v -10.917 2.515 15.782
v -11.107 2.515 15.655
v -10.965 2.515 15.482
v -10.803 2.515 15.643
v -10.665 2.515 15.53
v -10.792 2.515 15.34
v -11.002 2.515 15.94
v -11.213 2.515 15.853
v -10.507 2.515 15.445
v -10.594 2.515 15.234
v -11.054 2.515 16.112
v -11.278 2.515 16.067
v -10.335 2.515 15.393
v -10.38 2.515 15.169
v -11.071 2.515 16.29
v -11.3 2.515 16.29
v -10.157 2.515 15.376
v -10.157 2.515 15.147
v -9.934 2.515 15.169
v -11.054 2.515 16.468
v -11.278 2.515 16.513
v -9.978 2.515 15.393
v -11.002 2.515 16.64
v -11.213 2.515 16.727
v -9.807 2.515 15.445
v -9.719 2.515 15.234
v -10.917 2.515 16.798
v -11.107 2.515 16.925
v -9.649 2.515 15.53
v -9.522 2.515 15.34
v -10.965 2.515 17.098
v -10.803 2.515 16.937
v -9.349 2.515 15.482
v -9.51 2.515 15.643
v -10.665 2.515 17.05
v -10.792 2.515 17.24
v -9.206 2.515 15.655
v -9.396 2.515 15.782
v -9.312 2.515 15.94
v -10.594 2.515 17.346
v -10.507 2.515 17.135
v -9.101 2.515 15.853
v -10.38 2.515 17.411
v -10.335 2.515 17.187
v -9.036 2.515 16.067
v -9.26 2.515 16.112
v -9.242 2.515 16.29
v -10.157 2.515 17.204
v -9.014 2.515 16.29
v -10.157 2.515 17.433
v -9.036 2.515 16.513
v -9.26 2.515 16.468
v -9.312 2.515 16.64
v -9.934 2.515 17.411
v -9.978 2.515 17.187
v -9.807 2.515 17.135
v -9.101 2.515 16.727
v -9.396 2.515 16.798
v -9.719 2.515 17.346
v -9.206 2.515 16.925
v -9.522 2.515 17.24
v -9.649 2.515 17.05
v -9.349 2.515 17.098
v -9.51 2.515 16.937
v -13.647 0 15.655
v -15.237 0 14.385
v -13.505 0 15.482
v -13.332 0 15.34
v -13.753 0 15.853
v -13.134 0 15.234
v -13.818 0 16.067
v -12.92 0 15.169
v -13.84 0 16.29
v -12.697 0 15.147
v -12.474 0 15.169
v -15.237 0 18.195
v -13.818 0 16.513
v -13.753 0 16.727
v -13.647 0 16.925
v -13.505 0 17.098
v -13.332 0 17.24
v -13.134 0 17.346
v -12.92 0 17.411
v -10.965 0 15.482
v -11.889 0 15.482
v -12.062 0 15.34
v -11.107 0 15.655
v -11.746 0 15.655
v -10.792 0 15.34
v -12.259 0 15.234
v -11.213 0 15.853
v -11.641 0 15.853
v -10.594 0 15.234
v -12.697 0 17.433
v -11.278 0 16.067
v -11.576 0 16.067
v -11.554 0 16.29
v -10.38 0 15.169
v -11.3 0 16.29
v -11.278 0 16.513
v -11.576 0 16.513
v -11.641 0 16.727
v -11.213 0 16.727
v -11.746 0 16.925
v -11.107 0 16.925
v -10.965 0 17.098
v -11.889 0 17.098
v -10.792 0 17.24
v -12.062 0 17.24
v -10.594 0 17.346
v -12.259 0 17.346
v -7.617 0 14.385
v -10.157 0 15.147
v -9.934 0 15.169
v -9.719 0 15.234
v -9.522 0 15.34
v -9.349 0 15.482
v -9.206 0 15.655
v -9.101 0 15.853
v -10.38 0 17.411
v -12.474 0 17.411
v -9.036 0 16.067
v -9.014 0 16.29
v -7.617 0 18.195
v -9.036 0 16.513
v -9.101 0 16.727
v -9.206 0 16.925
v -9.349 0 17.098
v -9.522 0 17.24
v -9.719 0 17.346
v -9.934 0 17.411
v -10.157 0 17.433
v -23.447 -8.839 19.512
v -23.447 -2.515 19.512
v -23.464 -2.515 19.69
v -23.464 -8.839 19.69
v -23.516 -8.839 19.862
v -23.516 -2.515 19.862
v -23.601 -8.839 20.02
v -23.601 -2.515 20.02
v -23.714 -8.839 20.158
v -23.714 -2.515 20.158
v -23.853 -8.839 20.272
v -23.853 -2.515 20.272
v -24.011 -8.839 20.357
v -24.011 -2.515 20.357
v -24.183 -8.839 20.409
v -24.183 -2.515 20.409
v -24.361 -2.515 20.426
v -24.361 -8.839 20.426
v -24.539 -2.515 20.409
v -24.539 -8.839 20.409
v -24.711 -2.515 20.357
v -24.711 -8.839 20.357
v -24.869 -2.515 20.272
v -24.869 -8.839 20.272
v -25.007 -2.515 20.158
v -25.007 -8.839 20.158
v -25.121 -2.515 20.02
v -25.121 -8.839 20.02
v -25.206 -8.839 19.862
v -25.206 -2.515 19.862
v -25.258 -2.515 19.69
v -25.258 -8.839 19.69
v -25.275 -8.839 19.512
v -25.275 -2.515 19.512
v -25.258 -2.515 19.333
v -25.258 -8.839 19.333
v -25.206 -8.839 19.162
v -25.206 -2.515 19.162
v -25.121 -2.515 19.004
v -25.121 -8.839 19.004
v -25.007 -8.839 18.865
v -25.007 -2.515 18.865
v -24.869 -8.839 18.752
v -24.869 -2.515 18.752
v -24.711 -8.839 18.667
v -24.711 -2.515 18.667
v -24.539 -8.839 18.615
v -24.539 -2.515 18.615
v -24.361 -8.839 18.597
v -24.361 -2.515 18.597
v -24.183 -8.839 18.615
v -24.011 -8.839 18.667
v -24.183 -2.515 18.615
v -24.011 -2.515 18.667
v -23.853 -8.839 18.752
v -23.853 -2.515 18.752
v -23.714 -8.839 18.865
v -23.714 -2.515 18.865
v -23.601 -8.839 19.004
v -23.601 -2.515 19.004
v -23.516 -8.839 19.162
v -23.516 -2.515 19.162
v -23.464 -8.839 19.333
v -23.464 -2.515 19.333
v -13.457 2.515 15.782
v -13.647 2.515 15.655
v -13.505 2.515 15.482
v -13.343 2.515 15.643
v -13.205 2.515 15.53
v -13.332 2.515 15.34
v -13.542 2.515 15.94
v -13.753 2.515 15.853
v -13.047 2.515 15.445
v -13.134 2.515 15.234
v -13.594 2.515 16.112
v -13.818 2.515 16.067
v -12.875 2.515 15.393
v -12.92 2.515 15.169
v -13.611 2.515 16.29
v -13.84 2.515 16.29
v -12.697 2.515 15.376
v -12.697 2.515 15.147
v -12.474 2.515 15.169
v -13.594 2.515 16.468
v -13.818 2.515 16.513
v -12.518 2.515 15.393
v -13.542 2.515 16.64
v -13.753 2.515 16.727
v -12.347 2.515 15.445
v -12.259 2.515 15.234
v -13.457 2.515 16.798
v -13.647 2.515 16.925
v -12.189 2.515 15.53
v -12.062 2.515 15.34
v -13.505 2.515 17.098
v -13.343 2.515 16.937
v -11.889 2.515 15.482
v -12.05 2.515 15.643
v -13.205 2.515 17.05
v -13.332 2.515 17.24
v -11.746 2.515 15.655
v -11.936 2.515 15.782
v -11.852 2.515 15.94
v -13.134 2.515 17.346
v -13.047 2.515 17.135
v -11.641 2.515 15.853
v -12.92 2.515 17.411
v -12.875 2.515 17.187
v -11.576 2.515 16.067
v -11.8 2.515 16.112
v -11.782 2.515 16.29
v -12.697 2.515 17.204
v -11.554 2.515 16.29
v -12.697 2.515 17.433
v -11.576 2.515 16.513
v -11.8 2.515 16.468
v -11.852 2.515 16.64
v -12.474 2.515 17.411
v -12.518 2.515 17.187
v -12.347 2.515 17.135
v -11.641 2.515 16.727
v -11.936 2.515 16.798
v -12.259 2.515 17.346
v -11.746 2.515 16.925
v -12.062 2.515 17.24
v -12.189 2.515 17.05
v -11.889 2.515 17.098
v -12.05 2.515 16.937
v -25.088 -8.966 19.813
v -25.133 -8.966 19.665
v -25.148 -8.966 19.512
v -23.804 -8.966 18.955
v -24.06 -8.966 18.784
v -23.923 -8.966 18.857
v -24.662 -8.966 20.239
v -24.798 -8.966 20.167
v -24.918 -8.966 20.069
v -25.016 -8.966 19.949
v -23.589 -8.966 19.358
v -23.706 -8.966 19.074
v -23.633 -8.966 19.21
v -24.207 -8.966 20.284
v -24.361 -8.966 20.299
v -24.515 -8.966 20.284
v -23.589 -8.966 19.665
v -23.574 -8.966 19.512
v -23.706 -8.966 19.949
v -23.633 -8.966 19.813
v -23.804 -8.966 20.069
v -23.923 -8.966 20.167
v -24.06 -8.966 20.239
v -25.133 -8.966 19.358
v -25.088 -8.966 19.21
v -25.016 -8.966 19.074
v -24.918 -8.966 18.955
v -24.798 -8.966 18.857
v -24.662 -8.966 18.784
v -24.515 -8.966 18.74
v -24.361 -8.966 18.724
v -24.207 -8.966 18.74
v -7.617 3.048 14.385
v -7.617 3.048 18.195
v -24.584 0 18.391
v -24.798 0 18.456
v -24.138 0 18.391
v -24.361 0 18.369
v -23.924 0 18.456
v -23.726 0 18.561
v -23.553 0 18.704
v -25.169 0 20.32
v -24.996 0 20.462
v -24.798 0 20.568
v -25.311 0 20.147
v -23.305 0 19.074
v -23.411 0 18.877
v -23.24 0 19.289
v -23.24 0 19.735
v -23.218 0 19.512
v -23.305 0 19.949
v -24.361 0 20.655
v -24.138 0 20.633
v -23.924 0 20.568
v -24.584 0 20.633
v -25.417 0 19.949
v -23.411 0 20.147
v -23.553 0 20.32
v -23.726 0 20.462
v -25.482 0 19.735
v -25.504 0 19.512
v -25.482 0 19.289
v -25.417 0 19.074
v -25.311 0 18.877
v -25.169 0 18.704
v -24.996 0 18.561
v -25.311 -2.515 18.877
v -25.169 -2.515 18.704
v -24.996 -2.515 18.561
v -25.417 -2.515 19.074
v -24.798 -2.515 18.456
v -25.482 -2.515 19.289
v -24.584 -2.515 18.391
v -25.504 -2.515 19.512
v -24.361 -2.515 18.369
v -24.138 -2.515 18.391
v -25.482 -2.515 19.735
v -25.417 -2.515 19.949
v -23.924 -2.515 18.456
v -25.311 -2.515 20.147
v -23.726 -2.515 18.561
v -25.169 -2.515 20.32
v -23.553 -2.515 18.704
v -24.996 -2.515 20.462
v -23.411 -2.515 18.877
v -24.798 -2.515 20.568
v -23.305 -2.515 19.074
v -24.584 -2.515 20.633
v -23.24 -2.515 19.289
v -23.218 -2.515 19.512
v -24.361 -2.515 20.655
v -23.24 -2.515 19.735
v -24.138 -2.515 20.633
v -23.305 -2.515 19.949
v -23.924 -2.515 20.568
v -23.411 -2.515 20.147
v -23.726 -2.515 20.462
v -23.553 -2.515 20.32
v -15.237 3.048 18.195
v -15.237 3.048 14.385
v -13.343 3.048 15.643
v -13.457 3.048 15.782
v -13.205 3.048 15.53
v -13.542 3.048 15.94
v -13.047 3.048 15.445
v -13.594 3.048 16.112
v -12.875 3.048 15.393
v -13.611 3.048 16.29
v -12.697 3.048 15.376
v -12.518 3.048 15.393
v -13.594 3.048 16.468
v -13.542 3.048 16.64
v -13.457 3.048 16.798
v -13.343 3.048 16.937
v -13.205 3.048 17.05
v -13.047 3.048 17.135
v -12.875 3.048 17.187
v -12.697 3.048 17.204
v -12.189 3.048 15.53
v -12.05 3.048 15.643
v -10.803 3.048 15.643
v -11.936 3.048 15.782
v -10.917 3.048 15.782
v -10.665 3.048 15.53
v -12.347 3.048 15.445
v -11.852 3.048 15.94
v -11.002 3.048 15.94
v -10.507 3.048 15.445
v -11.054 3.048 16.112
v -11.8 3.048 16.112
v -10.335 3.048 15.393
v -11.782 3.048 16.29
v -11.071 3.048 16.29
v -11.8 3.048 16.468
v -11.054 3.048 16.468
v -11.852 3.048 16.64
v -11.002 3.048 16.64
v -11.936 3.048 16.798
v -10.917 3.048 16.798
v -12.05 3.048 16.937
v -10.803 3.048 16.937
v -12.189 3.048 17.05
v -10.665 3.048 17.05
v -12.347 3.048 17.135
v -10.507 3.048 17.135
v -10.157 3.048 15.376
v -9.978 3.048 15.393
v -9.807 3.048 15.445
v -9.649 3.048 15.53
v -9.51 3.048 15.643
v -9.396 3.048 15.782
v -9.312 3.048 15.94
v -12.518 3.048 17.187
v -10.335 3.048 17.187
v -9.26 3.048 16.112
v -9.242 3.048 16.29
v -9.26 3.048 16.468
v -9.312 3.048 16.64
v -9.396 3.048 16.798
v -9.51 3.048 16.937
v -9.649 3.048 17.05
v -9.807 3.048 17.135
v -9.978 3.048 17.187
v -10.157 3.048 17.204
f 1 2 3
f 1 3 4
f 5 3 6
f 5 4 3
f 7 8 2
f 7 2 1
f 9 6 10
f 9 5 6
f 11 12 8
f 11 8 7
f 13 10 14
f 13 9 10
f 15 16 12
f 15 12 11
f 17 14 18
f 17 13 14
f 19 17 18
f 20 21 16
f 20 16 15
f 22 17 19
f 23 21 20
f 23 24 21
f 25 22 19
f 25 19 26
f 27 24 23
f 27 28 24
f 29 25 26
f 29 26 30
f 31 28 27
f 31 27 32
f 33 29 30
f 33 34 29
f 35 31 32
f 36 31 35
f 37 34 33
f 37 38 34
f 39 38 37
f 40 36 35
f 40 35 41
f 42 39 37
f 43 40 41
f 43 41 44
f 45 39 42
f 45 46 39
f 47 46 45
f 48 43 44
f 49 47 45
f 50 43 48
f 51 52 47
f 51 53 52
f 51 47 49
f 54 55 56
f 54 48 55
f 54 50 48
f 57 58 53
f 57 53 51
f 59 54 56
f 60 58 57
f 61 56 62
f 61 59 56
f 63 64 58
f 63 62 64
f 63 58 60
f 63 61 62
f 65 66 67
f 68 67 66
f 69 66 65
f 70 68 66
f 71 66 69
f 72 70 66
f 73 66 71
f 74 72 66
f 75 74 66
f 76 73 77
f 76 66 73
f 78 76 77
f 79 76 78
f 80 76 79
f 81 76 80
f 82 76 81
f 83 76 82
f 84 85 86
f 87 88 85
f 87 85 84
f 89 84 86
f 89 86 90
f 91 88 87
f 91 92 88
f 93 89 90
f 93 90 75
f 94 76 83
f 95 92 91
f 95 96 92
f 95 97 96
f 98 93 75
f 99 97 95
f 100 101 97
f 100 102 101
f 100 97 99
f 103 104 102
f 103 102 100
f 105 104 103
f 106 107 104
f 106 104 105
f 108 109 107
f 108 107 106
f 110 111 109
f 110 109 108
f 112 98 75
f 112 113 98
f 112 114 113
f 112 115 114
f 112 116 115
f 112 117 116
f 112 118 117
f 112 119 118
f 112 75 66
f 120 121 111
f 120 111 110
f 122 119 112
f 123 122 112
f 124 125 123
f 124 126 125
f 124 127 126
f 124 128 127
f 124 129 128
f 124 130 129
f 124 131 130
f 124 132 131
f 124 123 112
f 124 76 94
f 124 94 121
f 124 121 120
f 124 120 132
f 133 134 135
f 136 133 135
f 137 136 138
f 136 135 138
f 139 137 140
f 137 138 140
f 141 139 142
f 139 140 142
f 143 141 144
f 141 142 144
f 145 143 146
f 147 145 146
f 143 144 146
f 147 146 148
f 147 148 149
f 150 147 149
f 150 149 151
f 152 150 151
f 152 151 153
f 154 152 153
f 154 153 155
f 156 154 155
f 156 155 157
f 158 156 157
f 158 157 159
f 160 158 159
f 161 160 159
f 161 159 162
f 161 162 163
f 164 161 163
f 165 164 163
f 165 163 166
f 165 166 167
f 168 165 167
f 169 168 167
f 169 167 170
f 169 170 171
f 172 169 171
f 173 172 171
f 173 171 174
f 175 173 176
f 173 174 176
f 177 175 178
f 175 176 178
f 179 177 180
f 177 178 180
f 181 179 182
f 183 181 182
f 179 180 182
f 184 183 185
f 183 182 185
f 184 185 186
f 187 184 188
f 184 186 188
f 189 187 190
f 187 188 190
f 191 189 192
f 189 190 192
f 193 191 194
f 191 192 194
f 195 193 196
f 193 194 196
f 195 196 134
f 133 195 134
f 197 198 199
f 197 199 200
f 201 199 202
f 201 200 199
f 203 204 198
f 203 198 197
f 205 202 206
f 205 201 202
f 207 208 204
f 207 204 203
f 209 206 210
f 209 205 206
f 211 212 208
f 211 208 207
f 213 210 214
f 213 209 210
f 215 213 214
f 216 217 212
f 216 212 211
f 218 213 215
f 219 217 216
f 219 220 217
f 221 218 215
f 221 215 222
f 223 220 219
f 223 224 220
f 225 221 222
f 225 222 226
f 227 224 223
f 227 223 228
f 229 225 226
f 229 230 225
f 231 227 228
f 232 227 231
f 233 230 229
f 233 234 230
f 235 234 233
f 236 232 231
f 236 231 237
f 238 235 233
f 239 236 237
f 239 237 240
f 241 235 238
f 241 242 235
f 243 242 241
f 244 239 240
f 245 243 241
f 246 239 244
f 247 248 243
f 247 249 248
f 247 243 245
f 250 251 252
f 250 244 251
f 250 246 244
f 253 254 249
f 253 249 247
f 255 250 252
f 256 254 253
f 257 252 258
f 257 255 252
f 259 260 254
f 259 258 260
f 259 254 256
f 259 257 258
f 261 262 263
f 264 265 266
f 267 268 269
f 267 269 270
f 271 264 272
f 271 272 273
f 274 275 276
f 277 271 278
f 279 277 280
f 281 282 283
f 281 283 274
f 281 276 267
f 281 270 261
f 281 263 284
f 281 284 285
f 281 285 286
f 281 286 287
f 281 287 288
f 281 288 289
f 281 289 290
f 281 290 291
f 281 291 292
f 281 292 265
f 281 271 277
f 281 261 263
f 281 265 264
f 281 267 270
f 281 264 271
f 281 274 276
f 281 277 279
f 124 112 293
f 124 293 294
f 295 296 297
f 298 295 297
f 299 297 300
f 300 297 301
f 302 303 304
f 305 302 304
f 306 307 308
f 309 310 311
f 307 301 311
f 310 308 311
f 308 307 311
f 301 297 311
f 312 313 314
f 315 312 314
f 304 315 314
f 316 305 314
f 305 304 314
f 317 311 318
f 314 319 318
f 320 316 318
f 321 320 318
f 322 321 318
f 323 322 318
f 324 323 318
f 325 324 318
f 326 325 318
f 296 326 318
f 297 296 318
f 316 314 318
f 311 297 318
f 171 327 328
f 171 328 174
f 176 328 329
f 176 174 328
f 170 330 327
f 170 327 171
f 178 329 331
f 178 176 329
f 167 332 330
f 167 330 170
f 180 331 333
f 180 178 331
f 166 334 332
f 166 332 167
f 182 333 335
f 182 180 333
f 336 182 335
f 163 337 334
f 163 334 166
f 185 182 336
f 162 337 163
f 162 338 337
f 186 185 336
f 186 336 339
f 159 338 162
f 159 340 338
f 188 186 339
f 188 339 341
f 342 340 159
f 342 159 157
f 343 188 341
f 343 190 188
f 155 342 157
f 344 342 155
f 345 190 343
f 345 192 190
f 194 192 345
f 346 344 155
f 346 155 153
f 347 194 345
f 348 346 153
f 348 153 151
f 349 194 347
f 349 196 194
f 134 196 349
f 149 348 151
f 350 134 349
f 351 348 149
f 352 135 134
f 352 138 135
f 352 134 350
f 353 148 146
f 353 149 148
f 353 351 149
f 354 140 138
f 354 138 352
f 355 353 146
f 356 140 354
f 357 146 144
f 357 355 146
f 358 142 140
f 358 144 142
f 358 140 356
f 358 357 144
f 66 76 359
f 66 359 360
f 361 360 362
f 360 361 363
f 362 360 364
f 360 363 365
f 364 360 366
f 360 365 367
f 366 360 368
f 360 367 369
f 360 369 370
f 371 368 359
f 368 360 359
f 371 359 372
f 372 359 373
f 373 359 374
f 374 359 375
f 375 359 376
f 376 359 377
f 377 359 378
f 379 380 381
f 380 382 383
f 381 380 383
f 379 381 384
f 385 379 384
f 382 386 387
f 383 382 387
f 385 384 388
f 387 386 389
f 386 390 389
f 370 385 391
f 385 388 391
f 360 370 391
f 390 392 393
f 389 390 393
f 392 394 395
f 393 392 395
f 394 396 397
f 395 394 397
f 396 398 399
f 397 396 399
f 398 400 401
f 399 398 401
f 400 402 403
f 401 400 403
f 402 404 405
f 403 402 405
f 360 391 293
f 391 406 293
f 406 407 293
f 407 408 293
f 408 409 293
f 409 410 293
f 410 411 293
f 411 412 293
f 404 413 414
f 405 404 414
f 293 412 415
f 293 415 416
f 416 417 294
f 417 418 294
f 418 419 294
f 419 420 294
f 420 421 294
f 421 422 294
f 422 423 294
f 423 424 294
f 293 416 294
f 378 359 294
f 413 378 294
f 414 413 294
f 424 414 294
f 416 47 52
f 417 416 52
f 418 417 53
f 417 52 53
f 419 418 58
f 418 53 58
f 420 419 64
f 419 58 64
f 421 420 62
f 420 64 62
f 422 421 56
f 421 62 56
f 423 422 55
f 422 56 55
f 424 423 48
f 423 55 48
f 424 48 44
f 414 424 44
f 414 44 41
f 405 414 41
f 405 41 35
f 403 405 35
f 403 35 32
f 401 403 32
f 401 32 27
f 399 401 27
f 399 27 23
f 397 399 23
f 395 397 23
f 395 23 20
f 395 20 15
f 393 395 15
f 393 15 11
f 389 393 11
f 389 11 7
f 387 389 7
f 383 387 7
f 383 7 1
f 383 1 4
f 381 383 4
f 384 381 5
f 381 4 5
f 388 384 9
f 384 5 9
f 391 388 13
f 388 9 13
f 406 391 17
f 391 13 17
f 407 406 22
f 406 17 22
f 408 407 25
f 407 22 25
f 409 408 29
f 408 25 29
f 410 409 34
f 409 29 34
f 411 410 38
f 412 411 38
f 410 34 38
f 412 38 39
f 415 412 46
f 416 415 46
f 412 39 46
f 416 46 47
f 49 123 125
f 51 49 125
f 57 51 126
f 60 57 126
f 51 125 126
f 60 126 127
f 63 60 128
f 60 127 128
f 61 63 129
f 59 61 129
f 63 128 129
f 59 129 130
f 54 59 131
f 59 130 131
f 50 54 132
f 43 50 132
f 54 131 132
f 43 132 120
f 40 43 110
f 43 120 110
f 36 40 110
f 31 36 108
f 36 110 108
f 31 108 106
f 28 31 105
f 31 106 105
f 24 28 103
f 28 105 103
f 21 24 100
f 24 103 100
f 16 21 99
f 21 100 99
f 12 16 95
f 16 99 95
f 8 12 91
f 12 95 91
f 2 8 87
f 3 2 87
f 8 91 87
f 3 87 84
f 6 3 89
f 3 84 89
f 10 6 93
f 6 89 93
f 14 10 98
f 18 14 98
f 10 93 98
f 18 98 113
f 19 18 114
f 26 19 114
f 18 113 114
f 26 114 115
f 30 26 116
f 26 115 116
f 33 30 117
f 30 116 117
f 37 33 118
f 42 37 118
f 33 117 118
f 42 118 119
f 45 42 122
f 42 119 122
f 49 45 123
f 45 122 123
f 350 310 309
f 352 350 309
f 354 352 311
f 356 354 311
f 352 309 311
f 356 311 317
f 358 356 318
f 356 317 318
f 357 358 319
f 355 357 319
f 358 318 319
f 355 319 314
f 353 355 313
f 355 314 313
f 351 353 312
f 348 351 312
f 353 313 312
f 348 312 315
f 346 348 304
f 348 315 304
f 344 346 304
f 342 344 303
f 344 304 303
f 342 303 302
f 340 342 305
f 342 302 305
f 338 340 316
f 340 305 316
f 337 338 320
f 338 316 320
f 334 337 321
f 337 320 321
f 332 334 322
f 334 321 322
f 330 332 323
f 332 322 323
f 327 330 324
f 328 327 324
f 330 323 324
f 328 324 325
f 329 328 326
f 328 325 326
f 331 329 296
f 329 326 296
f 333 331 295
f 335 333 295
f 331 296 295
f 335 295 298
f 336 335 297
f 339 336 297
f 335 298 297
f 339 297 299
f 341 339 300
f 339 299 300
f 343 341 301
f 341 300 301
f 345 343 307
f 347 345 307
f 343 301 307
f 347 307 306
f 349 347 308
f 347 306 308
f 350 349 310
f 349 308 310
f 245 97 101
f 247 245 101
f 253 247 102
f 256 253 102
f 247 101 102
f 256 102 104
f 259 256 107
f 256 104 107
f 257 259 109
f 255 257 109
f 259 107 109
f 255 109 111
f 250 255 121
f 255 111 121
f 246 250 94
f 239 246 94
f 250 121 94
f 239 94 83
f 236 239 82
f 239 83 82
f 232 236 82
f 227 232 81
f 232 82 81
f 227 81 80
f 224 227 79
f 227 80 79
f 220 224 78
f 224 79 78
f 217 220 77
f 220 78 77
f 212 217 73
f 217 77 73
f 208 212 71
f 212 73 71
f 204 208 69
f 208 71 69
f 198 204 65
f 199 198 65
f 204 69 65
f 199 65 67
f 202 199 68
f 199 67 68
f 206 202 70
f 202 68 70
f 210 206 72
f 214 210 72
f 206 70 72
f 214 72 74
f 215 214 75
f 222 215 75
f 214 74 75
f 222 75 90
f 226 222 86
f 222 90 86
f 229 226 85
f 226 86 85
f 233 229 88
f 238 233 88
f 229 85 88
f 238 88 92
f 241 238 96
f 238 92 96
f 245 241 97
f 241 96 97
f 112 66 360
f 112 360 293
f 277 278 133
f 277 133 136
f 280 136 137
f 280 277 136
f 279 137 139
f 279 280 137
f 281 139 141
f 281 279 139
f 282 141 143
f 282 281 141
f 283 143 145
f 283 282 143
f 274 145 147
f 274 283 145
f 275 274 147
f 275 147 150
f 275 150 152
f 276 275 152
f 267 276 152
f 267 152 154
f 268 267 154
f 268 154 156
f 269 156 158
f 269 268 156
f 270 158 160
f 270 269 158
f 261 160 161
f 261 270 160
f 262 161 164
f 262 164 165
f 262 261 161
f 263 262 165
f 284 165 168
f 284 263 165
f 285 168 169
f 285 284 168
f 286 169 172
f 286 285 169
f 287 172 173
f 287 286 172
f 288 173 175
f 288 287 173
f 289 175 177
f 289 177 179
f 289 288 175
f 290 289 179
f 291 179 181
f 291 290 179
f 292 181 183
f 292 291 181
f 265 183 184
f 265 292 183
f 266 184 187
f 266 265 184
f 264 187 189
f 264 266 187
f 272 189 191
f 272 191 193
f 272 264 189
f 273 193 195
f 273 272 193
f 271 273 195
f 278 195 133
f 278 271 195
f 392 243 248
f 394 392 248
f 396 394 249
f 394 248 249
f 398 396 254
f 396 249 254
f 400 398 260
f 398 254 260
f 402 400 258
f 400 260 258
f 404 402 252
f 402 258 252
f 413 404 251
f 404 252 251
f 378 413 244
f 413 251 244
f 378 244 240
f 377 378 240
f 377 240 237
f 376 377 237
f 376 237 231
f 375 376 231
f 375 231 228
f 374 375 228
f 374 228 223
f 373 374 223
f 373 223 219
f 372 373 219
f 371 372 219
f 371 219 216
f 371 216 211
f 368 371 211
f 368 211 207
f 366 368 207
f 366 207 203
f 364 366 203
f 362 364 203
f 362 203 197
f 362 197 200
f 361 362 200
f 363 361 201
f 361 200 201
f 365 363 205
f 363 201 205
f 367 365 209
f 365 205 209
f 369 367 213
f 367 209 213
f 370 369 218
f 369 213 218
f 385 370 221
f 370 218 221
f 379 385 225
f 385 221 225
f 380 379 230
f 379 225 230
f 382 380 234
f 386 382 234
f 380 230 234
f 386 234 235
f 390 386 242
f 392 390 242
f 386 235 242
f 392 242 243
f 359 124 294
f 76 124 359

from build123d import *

# Parameters (mm, degrees)
F0_R     = 0.9144
F1_DEPTH = 8.9662
F0_R_2   = 1.143
F2_DEPTH = 2.5146
F3_SIZE  = 0.127
F4_W     = 3.81
F4_H     = 0.635
F4_H_2   = 2.54
F4_R     = 1.143
F4_R_2   = 0.9144
F5_DEPTH = 3.048
F6_DEPTH = 2.5146
F7_DEPTH = 3.048


with BuildPart() as f1:
    # F0 (on Front) → F1 (new body)
    with BuildSketch(Plane.XZ):
        with Locations((-24.36091, 19.511819)):
            Circle(F0_R)
    extrude(amount=F1_DEPTH)

    # F0 (on Front) → F2 (join)
    with BuildSketch(Plane.XZ):
        with Locations((-24.36091, 19.511819)):
            Circle(F0_R_2)
        with Locations((-24.36091, 19.511819)):
            Circle(F0_R, mode=Mode.SUBTRACT)
    extrude(amount=F2_DEPTH)

    # F3
    f3_edges = [f1.edges().sort_by_distance(p)[0] for p in [
        (-25.27531, -8.9662, 19.511819),
    ]]
    chamfer(f3_edges, length=F3_SIZE)


with BuildPart() as f5:
    # F4 (on Front) → F5 (new body)
    with BuildSketch(Plane.XZ):
        with Locations((-13.331763, 17.877566)):
            Rectangle(F4_W, F4_H)
        with Locations((-9.521763, 17.877566)):
            Rectangle(F4_W, F4_H)
        with Locations((-9.521763, 16.290066)):
            Rectangle(F4_W, F4_H_2)
        with Locations((-10.156763, 16.290066)):
            Circle(F4_R, mode=Mode.SUBTRACT)
        with Locations((-13.331763, 16.290066)):
            Rectangle(F4_W, F4_H_2)
        with Locations((-12.696763, 16.290066)):
            Circle(F4_R, mode=Mode.SUBTRACT)
        with Locations((-12.696763, 16.290066)):
            Circle(F4_R)
        with Locations((-12.696763, 16.290066)):
            Circle(F4_R_2, mode=Mode.SUBTRACT)
        with Locations((-12.696763, 16.290066)):
            Circle(F4_R_2)
        with Locations((-10.156763, 16.290066)):
            Circle(F4_R_2)
        with Locations((-10.156763, 16.290066)):
            Circle(F4_R)
        with Locations((-10.156763, 16.290066)):
            Circle(F4_R_2, mode=Mode.SUBTRACT)
        with Locations((-13.331763, 14.702566)):
            Rectangle(F4_W, F4_H)
        with Locations((-9.521763, 14.702566)):
            Rectangle(F4_W, F4_H)
    extrude(amount=-F5_DEPTH)

    # F4 (on Front) → F6 (cut)
    with BuildSketch(Plane.XZ):
        with Locations((-12.696763, 16.290066)):
            Circle(F4_R)
        with Locations((-12.696763, 16.290066)):
            Circle(F4_R_2, mode=Mode.SUBTRACT)
        with Locations((-10.156763, 16.290066)):
            Circle(F4_R)
        with Locations((-10.156763, 16.290066)):
            Circle(F4_R_2, mode=Mode.SUBTRACT)
    extrude(amount=-F6_DEPTH, mode=Mode.SUBTRACT)

    # F4 (on Front) → F7 (cut)
    with BuildSketch(Plane.XZ):
        with Locations((-12.696763, 16.290066)):
            Circle(F4_R_2)
        with Locations((-10.156763, 16.290066)):
            Circle(F4_R_2)
    extrude(amount=-F7_DEPTH, mode=Mode.SUBTRACT)


solid = Compound([f1.part, f5.part])
